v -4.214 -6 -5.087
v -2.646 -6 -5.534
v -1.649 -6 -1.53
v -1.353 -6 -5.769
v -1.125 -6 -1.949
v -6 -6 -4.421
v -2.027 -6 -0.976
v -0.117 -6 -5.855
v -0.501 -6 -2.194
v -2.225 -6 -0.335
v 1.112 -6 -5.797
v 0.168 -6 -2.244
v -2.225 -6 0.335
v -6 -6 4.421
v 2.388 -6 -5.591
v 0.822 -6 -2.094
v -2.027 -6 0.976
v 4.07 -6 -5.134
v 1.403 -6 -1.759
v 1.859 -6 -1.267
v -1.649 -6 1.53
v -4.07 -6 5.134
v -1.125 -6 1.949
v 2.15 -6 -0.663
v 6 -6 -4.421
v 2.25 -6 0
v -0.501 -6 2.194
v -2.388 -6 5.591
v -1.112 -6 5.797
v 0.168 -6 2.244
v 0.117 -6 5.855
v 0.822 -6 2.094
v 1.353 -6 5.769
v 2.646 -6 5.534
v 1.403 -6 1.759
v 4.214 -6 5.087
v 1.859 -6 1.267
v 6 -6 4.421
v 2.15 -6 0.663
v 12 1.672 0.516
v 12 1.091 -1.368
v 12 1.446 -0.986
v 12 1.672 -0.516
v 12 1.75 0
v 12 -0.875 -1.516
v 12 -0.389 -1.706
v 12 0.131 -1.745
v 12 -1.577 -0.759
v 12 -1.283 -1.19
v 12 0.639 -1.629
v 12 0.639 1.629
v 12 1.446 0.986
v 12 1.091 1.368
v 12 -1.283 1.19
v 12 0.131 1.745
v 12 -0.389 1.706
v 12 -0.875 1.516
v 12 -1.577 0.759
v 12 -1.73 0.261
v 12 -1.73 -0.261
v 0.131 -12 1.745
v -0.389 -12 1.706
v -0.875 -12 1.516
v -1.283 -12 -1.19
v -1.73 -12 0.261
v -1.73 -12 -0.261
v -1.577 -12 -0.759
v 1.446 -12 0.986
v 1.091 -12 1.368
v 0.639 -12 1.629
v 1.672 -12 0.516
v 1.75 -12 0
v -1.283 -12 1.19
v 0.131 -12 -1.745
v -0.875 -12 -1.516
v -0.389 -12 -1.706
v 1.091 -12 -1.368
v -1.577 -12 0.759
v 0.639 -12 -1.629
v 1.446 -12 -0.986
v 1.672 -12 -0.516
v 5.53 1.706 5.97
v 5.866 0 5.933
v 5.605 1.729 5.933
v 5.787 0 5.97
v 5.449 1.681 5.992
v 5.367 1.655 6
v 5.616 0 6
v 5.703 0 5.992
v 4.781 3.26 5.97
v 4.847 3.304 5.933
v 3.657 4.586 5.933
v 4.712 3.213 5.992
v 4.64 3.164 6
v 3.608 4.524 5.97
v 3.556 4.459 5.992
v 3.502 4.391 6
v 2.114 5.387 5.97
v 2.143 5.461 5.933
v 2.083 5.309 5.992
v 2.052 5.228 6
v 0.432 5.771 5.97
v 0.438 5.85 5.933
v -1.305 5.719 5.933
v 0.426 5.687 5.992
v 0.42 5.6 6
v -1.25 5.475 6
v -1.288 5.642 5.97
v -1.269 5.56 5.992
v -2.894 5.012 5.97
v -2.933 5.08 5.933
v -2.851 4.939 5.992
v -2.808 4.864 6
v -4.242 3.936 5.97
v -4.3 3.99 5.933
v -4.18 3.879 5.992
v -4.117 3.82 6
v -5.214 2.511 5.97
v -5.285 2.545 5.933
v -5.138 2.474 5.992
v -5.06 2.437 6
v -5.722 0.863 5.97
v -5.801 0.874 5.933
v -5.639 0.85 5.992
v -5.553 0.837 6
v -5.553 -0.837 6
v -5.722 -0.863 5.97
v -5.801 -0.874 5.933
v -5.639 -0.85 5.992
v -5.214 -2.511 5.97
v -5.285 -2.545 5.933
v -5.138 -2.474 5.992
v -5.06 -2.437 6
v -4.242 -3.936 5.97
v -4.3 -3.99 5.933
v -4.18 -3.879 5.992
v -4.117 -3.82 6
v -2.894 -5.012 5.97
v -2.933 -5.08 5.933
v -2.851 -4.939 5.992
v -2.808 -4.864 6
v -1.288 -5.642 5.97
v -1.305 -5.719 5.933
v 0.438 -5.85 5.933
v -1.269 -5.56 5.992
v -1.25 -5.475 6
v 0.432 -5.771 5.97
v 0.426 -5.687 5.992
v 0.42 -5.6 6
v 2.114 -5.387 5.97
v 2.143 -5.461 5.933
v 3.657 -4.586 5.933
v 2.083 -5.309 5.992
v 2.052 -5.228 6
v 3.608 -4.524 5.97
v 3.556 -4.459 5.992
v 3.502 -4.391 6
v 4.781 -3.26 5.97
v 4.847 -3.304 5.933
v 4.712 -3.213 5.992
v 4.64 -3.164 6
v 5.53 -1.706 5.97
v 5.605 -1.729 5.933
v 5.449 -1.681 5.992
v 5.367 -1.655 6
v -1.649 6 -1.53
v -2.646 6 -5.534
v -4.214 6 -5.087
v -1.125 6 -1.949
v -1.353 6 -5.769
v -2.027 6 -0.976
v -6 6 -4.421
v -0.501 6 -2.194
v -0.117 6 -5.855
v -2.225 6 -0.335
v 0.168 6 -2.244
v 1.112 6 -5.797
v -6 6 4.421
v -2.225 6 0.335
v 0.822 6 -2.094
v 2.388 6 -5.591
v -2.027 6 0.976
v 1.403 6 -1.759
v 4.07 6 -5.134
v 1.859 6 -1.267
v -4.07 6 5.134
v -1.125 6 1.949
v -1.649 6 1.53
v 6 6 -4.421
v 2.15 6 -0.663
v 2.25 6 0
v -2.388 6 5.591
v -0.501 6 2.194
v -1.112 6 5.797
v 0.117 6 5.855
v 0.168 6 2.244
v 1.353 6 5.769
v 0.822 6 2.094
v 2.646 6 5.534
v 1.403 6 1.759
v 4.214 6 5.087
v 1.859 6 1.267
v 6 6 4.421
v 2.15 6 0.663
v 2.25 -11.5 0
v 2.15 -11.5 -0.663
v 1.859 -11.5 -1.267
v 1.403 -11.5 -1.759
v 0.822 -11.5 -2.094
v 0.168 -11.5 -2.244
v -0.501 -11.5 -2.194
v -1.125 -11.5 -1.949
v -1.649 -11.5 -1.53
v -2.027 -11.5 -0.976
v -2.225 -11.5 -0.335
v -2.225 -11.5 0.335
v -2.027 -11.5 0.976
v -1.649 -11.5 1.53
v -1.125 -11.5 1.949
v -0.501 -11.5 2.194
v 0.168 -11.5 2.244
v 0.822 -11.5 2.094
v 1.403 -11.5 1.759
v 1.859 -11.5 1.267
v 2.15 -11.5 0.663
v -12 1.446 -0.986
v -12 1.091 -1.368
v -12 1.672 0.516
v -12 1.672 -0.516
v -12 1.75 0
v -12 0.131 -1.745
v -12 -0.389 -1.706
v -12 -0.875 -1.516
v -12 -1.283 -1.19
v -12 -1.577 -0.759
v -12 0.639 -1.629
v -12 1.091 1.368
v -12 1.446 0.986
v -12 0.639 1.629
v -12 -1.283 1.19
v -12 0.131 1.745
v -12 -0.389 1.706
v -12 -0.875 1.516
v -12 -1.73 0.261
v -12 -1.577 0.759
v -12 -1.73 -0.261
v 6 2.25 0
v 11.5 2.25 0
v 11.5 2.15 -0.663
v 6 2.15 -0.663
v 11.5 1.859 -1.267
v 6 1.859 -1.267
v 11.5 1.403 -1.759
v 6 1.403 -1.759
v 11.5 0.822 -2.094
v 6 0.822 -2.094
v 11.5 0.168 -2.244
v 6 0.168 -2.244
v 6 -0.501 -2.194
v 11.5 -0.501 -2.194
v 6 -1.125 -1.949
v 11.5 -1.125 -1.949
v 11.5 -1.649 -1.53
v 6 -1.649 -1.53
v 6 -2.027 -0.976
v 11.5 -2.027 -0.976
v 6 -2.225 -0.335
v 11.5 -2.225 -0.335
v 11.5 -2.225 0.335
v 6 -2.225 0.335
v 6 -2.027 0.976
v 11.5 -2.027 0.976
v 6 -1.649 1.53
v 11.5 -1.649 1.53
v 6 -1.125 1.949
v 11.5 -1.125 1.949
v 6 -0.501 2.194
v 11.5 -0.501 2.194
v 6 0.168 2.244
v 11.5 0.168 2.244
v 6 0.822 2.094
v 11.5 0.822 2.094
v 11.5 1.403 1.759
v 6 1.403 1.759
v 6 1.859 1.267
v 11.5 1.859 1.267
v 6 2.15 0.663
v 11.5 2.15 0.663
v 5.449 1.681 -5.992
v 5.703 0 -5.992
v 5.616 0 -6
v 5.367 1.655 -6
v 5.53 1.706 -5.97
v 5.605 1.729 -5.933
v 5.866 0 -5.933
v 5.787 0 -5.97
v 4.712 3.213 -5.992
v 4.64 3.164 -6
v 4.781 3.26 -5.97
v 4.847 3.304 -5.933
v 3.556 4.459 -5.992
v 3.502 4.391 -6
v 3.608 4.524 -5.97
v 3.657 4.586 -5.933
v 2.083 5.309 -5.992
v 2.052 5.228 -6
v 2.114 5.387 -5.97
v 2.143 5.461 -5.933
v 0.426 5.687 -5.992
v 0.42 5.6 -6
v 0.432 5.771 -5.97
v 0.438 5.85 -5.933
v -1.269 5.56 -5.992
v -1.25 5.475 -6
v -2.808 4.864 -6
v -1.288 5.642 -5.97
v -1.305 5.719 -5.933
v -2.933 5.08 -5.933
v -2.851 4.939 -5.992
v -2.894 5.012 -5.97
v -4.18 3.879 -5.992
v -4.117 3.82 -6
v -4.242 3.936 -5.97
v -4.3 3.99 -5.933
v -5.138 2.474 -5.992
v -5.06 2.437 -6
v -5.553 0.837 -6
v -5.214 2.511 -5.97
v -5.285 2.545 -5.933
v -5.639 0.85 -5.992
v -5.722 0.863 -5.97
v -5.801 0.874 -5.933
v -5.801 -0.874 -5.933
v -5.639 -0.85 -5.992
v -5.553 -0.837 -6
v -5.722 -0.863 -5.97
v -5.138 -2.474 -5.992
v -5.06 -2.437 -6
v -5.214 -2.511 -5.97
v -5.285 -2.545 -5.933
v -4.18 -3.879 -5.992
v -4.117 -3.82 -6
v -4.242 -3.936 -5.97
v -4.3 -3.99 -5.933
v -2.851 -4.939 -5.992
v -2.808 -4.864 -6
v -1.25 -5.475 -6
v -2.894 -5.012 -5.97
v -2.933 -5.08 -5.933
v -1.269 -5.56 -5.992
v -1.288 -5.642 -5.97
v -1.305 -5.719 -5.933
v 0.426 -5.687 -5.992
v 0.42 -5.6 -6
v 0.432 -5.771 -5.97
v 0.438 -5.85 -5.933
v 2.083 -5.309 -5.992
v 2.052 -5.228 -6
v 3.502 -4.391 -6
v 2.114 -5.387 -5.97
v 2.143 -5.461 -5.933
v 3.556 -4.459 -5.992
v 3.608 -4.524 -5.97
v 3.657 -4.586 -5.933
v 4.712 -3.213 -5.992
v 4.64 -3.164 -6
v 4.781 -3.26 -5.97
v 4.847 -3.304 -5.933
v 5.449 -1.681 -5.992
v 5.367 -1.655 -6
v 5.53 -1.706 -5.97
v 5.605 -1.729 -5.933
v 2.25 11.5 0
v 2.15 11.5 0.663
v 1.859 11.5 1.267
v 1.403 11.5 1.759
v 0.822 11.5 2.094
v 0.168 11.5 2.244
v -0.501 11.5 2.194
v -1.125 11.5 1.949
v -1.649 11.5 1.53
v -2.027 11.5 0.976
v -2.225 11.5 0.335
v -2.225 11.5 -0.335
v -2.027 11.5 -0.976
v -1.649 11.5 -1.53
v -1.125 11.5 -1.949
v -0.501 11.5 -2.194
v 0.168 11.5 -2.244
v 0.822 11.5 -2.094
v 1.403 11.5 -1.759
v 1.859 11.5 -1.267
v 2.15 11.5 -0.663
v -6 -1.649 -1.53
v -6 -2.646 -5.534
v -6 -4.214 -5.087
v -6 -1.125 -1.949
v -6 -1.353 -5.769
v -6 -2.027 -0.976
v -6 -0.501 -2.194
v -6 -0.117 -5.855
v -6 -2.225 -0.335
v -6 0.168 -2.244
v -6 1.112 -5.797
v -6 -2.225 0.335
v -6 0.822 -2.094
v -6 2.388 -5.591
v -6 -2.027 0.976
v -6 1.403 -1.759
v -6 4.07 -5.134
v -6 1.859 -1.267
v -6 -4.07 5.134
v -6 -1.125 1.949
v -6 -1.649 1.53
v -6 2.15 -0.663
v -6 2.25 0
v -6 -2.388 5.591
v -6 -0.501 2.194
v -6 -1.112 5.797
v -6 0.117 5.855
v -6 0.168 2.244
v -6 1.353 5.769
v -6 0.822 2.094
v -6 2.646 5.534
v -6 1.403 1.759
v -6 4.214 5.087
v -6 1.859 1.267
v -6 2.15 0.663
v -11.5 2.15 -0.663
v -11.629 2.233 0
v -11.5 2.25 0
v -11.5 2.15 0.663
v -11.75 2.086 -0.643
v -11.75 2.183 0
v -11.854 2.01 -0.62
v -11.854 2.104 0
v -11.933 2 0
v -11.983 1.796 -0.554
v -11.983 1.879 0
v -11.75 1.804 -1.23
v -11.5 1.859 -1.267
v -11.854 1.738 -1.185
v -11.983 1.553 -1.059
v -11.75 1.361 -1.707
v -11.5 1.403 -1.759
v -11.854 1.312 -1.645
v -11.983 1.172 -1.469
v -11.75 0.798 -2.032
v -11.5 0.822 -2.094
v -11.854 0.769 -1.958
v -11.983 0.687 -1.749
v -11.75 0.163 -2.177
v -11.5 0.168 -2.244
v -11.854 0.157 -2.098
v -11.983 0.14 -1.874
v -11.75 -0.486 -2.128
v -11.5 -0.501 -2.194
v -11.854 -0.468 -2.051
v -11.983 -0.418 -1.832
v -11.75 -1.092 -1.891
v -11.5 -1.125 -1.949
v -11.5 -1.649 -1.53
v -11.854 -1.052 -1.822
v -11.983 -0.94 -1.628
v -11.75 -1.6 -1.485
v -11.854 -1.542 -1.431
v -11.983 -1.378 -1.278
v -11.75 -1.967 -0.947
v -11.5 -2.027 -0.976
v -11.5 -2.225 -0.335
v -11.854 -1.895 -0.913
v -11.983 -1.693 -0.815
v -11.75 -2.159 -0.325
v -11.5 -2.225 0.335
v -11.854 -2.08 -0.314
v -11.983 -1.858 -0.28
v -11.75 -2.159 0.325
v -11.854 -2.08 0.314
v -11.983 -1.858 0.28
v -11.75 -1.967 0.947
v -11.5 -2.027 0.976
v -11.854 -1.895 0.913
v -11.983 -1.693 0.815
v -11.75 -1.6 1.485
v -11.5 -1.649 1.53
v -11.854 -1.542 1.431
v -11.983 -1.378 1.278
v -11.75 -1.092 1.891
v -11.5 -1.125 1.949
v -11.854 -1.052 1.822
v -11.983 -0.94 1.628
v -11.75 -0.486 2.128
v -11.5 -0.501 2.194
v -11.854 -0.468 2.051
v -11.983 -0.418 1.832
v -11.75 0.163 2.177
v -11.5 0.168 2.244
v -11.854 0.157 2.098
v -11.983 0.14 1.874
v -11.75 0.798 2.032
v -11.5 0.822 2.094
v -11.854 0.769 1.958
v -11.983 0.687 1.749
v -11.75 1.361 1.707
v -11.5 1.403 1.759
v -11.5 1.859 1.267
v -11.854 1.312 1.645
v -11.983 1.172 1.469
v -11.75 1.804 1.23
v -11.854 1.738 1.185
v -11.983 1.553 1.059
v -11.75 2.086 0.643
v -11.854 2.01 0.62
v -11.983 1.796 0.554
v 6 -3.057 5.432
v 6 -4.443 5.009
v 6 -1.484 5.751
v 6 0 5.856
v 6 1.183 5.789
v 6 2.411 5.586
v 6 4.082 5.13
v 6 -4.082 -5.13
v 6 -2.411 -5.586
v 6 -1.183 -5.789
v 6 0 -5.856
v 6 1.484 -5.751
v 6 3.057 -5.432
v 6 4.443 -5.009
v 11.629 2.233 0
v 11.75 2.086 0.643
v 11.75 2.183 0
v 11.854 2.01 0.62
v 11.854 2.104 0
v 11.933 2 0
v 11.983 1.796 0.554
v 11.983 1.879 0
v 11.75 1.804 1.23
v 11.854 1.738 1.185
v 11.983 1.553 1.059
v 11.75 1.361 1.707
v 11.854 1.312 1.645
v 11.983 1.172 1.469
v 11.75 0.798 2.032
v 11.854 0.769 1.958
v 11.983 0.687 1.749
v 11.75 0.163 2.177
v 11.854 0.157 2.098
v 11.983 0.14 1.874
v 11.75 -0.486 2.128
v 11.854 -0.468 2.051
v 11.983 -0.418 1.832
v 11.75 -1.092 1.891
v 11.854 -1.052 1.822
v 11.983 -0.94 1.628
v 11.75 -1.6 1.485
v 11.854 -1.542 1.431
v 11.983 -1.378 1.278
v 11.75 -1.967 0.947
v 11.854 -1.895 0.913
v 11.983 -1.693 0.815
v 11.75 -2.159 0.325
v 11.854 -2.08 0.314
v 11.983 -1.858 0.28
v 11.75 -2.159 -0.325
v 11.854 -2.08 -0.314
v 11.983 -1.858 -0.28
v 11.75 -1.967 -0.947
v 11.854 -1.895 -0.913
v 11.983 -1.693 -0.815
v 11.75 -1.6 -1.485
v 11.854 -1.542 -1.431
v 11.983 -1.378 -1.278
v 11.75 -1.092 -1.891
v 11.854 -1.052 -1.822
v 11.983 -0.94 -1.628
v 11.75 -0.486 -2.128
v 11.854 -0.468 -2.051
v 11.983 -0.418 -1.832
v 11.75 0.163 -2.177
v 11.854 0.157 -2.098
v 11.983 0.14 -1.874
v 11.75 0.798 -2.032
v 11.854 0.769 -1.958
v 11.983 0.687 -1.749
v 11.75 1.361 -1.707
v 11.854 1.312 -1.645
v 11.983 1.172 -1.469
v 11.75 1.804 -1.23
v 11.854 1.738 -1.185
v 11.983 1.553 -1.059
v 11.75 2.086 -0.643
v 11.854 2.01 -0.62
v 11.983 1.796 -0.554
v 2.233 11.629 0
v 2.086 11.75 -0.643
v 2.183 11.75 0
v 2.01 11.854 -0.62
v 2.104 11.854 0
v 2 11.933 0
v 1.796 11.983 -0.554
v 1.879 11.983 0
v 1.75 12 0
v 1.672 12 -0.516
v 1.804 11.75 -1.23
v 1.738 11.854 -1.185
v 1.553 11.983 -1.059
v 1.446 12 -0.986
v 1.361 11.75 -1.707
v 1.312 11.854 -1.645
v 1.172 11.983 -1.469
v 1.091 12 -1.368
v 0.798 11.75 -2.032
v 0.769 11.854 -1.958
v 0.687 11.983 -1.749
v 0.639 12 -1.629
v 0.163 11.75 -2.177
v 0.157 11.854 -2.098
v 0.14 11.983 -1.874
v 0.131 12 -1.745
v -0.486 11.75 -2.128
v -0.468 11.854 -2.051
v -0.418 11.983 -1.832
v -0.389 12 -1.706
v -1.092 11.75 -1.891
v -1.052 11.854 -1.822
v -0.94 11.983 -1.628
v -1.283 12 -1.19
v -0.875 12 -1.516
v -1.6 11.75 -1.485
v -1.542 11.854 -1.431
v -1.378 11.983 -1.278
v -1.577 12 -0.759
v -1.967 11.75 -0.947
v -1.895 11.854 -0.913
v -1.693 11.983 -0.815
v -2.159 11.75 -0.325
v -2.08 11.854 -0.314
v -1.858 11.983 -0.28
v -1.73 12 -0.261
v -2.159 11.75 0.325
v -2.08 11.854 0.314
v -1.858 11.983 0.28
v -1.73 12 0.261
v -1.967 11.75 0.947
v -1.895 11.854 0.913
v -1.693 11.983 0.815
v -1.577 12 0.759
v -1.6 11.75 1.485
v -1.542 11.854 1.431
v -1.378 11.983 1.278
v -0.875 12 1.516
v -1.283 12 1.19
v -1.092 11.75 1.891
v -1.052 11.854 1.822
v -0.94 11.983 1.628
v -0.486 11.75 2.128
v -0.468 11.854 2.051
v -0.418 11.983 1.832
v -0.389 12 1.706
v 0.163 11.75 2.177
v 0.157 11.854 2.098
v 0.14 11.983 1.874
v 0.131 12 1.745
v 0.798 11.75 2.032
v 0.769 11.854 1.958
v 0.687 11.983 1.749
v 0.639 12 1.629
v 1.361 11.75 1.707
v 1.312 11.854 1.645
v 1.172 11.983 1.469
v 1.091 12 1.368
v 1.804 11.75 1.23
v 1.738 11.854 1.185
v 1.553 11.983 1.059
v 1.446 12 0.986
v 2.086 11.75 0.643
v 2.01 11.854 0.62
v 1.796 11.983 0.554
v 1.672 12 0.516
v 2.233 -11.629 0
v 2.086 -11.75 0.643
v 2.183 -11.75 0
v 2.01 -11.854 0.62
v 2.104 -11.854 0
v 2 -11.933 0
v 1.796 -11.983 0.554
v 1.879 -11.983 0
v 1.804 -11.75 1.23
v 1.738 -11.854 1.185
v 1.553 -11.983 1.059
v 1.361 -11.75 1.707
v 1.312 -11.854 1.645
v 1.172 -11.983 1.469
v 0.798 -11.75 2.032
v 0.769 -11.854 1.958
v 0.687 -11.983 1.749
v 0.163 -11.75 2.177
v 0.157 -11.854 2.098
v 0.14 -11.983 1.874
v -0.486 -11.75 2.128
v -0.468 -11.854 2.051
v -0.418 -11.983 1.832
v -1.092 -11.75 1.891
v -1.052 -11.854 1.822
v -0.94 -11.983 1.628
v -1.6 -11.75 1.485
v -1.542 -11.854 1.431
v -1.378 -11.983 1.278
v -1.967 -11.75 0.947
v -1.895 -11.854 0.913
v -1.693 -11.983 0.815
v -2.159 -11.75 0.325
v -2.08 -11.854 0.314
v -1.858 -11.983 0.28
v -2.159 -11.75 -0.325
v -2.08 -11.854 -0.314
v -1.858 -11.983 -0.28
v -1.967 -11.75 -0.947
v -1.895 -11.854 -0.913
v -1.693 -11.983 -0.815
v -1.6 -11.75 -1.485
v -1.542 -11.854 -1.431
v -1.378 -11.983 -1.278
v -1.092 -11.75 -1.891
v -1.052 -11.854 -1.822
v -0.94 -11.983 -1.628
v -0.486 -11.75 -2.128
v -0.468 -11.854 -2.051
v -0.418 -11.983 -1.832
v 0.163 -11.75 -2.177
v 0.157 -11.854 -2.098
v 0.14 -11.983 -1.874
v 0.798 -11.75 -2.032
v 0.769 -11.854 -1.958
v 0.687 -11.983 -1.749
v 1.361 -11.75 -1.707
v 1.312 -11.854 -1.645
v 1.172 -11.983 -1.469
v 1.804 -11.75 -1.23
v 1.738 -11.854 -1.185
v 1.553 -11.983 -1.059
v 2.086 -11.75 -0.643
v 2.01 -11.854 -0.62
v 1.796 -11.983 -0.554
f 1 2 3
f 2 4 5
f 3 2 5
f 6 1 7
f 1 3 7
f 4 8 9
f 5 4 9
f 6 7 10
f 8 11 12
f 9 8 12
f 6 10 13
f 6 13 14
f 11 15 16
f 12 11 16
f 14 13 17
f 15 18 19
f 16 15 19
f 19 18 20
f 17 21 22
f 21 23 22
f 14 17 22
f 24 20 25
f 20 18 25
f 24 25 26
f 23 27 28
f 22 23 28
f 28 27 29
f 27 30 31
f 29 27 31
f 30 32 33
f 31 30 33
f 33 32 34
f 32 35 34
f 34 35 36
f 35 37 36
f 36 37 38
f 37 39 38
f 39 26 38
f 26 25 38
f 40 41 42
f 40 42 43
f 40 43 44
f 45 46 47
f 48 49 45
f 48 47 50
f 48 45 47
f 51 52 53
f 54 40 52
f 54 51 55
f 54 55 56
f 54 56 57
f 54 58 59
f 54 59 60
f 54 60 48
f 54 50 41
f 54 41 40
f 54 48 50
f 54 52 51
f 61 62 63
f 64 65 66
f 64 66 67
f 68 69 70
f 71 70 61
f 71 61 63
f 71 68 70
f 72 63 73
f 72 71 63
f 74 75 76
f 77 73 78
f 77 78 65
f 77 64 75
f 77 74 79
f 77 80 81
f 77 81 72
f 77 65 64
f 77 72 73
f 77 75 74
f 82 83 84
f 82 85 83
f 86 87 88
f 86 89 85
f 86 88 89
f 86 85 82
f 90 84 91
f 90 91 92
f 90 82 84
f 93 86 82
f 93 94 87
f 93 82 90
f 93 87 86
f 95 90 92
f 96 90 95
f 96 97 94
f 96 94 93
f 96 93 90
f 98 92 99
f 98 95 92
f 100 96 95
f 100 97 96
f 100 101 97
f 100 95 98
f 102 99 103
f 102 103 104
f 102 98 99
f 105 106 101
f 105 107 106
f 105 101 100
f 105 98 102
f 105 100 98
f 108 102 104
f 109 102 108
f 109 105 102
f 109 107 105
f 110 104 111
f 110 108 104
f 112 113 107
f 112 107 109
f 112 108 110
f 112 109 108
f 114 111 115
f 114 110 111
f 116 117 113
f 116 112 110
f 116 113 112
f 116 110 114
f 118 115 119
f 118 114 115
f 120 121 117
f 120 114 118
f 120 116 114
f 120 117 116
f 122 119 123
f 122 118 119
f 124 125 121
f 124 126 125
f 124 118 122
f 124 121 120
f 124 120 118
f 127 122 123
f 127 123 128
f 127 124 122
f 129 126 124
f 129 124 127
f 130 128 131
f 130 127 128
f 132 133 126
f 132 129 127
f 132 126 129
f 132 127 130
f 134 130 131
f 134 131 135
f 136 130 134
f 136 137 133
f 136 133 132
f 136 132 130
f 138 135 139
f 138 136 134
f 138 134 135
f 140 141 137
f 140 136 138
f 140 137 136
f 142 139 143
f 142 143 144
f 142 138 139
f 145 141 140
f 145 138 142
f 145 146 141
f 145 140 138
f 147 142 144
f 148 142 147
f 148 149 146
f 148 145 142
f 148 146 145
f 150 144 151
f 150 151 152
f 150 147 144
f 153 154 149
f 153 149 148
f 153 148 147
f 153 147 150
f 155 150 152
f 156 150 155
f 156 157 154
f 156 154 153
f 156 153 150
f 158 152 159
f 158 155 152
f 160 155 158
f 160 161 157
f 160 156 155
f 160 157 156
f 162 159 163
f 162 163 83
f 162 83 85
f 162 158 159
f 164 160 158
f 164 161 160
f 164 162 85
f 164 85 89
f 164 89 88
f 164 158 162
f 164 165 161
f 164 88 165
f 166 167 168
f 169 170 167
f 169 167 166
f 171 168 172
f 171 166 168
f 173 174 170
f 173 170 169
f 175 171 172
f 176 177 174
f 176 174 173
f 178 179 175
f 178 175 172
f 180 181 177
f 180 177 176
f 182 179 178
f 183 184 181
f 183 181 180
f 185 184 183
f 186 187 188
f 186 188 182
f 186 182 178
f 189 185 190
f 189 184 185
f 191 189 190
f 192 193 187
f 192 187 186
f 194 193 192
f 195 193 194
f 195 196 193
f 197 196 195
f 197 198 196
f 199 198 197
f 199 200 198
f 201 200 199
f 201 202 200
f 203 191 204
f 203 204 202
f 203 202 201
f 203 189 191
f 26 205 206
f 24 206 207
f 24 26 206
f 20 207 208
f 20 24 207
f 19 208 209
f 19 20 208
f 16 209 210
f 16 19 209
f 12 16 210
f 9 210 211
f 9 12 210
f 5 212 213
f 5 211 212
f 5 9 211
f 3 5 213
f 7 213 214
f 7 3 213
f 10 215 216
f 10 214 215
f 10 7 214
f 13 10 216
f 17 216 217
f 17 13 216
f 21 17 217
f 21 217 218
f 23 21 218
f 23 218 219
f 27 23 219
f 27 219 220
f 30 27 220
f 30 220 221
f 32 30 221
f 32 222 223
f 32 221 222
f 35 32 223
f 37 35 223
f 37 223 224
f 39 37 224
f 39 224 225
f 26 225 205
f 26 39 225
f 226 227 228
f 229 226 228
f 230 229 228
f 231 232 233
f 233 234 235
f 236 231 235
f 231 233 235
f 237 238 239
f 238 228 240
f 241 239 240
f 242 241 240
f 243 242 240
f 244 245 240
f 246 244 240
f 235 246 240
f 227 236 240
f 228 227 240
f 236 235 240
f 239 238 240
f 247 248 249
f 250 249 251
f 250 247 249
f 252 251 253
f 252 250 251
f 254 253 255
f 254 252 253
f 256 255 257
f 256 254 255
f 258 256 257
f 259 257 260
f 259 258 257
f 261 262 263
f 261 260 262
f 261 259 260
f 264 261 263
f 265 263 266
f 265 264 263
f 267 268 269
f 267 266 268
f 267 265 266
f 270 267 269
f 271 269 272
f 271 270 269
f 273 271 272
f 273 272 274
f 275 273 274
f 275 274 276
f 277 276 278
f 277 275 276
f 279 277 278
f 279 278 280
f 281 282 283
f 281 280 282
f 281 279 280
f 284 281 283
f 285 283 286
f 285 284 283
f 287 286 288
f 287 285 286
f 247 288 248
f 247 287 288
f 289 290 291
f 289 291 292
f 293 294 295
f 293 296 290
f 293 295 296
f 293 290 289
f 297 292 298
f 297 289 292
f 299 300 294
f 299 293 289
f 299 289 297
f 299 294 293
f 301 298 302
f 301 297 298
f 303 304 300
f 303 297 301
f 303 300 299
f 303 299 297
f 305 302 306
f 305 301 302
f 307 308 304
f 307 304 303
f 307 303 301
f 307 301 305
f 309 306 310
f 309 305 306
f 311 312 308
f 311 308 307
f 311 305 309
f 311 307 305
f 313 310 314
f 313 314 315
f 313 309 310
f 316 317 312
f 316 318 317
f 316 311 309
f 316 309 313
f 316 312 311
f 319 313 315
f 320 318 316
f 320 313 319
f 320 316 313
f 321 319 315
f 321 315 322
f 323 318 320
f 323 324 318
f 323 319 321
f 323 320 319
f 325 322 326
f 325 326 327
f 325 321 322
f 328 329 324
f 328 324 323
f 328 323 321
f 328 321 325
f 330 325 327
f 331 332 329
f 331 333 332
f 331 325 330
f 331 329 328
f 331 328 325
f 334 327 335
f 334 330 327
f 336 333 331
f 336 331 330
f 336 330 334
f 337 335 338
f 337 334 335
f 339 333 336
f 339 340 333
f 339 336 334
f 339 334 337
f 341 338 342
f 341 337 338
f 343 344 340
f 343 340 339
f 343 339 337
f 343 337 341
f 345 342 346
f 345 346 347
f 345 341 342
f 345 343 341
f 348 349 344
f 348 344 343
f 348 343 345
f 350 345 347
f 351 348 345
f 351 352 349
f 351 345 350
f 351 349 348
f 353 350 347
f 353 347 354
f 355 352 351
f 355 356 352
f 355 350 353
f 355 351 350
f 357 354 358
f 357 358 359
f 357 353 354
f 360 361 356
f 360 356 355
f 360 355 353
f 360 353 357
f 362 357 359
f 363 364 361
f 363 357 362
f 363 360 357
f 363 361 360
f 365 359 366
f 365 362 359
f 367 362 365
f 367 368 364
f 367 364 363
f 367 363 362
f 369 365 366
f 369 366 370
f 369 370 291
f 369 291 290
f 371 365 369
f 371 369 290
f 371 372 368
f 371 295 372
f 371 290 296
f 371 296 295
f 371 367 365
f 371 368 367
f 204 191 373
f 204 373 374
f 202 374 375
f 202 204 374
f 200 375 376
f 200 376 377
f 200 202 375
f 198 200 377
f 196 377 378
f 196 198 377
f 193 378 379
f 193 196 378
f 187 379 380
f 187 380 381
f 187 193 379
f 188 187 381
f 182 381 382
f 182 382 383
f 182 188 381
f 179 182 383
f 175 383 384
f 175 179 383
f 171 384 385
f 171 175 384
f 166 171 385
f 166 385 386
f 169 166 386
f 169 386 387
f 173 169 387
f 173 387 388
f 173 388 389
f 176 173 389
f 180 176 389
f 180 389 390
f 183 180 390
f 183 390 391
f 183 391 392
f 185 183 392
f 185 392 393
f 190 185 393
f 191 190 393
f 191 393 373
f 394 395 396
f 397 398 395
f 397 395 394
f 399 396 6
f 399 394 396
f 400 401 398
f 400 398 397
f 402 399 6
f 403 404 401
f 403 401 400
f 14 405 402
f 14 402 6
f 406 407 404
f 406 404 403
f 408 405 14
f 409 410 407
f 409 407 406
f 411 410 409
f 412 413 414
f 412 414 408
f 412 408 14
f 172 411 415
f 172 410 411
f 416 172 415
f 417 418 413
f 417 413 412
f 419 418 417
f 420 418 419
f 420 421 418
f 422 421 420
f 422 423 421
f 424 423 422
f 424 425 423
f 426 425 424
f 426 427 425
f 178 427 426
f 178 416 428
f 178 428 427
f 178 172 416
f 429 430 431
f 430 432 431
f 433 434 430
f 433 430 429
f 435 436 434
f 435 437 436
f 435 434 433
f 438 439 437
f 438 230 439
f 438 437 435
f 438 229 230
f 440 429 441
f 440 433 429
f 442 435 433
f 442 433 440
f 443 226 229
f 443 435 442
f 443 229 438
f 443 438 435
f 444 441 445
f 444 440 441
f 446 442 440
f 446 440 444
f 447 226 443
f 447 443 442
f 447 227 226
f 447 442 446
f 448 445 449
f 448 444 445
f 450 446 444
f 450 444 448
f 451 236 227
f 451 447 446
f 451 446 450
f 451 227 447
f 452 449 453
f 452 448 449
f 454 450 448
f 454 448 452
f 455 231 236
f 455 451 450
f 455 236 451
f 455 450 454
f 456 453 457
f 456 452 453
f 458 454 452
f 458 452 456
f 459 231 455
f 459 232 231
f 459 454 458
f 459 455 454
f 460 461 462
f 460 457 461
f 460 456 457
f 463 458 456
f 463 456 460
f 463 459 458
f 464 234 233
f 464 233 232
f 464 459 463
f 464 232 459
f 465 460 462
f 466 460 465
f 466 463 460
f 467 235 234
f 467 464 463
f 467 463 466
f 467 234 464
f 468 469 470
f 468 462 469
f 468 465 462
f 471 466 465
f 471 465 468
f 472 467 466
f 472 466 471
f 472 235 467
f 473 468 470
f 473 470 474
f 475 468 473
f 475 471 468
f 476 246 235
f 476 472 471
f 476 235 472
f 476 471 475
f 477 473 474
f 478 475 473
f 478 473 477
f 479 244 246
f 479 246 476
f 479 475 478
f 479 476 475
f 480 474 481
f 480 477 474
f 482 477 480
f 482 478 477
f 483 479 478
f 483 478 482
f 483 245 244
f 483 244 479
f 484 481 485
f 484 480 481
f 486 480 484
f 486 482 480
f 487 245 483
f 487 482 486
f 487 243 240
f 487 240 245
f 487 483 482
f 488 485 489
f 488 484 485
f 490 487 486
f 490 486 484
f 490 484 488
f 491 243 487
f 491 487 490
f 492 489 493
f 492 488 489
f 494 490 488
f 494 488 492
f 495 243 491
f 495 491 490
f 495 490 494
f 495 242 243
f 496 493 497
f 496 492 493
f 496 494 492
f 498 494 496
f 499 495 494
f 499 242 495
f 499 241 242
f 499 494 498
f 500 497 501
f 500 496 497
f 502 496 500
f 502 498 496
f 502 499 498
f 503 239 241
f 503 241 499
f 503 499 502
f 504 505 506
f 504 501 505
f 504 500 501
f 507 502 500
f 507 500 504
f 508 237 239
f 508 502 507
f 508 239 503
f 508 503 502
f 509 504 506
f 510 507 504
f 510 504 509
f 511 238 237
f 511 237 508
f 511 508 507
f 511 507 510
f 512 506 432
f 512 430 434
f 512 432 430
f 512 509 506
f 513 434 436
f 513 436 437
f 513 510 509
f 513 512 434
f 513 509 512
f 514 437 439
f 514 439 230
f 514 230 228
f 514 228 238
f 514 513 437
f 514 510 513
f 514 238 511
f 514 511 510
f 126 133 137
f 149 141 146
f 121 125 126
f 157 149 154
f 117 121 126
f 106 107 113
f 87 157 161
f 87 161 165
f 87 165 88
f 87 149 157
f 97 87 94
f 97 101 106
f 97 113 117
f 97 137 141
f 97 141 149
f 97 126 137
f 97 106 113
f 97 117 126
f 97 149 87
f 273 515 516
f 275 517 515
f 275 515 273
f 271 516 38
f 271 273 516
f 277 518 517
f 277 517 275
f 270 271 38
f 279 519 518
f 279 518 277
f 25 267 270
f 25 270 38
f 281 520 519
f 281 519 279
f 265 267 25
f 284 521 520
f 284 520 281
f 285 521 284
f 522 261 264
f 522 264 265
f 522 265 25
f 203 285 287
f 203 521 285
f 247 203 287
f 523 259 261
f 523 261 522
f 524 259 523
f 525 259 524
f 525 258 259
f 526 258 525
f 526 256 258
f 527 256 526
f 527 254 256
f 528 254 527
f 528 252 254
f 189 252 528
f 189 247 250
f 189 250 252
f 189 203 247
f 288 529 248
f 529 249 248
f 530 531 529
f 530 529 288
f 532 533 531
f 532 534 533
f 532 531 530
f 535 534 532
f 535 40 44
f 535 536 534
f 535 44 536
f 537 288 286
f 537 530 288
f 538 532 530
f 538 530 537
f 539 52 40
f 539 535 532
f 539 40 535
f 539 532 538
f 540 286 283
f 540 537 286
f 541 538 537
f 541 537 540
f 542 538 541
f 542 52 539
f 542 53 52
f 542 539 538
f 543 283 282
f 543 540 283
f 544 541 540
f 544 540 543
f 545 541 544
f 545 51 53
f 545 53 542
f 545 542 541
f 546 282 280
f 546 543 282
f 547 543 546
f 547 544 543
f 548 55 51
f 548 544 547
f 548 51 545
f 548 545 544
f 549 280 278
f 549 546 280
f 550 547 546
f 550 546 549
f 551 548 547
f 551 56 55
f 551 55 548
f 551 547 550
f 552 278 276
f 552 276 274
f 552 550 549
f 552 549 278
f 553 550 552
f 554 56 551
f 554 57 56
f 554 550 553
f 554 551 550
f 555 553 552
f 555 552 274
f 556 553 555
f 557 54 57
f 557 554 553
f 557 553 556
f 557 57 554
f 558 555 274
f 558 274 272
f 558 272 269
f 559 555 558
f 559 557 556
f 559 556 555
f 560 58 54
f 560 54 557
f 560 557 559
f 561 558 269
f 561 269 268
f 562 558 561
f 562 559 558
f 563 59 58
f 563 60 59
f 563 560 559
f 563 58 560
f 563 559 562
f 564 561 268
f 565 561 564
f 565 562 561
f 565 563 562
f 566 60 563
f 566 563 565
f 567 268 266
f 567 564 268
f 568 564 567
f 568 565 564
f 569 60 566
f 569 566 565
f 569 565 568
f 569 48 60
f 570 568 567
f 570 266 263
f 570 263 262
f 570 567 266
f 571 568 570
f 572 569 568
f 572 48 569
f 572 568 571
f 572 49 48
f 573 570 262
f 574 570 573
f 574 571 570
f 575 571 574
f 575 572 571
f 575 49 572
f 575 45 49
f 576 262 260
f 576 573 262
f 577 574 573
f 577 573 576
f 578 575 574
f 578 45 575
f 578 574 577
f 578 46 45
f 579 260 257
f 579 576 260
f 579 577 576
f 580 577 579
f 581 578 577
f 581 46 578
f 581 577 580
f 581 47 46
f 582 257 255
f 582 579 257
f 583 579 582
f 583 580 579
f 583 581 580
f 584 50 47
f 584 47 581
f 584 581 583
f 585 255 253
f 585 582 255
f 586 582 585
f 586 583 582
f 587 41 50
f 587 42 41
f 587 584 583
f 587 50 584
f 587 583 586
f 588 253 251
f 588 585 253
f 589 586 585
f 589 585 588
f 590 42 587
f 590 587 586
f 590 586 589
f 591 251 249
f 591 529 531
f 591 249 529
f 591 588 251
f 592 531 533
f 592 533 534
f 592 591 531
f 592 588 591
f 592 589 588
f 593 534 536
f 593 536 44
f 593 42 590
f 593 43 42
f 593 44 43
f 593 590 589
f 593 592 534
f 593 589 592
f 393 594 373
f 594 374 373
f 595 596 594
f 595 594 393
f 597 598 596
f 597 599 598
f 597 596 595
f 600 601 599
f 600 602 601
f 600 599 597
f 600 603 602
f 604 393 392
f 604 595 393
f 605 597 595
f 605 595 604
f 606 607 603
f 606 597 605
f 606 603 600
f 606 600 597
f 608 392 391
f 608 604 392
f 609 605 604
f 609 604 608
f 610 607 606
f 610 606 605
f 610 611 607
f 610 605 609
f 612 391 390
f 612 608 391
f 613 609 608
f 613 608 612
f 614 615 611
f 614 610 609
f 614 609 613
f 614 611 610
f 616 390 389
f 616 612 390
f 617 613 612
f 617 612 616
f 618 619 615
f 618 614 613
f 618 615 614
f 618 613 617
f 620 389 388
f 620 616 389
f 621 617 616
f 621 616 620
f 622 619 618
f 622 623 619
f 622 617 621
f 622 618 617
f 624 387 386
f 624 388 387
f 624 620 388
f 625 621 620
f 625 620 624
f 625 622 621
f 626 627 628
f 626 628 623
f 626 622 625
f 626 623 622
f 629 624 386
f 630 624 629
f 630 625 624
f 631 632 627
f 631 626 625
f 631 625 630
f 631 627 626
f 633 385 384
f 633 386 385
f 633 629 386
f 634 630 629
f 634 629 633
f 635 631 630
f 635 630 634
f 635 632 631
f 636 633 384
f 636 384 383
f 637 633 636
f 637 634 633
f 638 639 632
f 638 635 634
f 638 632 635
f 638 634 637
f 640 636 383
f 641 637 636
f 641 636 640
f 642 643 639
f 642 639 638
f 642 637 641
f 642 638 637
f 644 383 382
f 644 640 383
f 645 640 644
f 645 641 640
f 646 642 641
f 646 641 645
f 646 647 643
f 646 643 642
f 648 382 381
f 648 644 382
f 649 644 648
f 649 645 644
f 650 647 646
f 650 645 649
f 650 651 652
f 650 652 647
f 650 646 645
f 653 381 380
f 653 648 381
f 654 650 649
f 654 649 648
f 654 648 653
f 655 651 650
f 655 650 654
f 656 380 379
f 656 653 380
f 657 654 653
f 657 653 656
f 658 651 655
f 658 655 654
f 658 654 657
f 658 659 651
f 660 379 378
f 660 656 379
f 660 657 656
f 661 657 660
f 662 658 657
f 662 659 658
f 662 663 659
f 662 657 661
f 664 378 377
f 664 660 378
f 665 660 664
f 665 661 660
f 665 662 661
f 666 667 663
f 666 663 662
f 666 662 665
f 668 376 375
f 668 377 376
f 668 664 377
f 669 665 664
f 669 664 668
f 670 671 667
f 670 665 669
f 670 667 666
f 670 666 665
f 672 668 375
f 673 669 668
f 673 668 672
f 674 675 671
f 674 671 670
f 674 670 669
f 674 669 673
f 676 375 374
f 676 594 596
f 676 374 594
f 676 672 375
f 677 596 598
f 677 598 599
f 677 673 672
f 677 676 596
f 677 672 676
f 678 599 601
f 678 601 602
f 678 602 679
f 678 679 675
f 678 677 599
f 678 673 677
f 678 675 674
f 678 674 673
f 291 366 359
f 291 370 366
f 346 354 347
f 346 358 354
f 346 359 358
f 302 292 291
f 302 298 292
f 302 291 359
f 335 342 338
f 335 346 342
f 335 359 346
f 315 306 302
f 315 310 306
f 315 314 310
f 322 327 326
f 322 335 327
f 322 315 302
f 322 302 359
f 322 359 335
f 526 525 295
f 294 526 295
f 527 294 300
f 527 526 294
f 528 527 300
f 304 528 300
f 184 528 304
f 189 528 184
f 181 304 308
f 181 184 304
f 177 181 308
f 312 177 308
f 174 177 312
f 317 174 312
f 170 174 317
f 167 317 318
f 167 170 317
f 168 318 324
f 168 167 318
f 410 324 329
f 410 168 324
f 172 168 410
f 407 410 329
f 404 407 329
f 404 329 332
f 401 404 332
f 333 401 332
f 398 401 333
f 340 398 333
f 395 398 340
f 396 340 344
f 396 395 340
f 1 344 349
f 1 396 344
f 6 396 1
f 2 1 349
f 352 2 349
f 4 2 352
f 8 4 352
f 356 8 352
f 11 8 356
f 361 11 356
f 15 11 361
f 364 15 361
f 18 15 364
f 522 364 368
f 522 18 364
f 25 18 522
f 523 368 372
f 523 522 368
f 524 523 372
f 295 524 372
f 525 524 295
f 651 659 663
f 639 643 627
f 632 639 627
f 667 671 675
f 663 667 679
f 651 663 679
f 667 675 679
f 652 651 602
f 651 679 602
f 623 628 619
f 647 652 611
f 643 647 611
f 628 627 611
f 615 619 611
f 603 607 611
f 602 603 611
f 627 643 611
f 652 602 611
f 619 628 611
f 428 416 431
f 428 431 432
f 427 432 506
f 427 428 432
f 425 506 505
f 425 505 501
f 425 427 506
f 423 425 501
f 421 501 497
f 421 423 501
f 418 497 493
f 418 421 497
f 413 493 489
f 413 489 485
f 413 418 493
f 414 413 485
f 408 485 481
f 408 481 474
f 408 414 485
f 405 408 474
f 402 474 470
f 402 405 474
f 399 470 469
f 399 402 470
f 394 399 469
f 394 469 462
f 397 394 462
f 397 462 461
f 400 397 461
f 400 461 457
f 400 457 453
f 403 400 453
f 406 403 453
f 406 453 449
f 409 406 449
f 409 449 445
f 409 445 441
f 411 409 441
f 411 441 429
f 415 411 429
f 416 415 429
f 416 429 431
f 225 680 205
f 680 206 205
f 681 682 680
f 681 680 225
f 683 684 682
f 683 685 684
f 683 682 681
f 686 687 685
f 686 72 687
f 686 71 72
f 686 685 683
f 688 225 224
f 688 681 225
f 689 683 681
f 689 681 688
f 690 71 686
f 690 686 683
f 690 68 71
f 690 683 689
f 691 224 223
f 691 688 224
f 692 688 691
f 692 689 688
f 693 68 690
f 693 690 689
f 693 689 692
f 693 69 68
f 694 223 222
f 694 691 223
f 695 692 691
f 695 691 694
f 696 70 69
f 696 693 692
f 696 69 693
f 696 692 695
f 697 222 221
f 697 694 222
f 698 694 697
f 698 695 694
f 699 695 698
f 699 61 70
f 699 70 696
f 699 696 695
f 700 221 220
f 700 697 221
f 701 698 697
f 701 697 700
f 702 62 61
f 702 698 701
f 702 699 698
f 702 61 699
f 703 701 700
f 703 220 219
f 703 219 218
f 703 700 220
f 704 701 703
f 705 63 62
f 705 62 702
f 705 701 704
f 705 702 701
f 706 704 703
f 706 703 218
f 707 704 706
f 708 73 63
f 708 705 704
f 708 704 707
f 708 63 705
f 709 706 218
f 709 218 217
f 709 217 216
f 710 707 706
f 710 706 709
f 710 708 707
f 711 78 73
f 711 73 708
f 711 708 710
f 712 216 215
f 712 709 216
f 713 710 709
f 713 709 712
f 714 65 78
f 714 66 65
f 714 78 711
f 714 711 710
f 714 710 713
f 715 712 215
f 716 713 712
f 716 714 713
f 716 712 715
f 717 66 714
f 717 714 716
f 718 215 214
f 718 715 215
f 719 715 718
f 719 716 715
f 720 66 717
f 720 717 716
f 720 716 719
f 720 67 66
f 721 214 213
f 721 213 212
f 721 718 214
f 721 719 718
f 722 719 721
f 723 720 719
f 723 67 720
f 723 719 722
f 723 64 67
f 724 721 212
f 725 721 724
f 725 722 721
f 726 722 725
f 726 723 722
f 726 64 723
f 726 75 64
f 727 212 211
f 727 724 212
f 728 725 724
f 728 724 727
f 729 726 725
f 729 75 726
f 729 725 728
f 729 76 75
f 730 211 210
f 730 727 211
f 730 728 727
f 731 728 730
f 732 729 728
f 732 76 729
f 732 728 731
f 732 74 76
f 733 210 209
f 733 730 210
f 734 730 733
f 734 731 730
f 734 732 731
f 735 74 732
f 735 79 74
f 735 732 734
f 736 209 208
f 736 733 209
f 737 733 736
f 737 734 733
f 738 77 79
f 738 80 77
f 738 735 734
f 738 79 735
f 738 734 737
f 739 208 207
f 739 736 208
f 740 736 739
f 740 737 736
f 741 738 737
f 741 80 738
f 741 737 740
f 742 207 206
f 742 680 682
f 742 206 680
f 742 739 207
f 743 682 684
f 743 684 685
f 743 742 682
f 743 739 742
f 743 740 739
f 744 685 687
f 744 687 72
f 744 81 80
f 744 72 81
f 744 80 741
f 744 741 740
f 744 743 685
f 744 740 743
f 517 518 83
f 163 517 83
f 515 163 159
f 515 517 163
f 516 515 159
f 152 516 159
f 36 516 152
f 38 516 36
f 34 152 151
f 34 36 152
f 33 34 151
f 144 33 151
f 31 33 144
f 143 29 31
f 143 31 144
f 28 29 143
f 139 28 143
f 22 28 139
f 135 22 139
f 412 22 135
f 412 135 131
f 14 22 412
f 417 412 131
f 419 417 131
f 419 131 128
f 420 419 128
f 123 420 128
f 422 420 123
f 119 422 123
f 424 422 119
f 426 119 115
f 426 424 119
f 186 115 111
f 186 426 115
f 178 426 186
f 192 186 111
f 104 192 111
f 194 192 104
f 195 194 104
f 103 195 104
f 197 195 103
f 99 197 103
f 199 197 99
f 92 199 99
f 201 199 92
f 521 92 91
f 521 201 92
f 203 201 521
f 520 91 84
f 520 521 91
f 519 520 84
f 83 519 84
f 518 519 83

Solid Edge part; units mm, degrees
sketch "Sketch1" plane through (0, 0, 0) normal (0, -1, 0) x (1, 0, 0)
  line L0 (6, -6) -> (-6, -6)
  line L1 (-6, -6) -> (-6, 6)
  line L2 (-6, 6) -> (6, 6)
  line L3 (6, 6) -> (6, -6)
  dimension "D1" = 12
  dimension "D2" = 12
extrude "Protrusion1" add sketch "Sketch1" along normal mid plane 12
sketch "Sketch2" plane through (0, 0, 0) normal (0, -1, 0) x (1, 0, 0)
  line L0 (9.56, 3.8003) -> (5.75, 6)
  line L1 (5.75, 6) -> (12.1, 6)
  line L2 (12.1, 6) -> (12.1, -6)
  line L3 (12.1, -6) -> (5.75, -6)
  line L4 (5.75, -6) -> (9.56, -3.8003)
  line L5 (9.56, -3.8003) -> (9.56, 3.8003)
revolve "RevolvedCutout1" cut sketch "Sketch2" angle 360 about axis through (0, 0, 0) along (0, 0, 1)
sketch "Sketch3" plane through (0, 0, 0) normal (1, 0, 0) x (0, 1, 0)
  circle A0 centre (0, 0) radius 2.25
  dimension "D1" = 4.5
extrude "ExtrudedProtrusion_3" add sketch "Sketch3" along normal mid plane 24
sketch "Sketch4" plane through (0, 0, 0) normal (0, -1, 0) x (1, 0, 0)
  circle A0 centre (0, 0) radius 2.25
  dimension "D1" = 4.5
extrude "ExtrudedProtrusion_4" add sketch "Sketch4" along normal mid plane 24
fillet "Round_1" radius 0.5 6 edges at (-2.25, -12, 0) (12, -2.25, 0) (-2.25, 12, 0) (-12, -2.25, 0) (-5.75, 0, 6) (-5.75, 0, -6)
extrude "ExtrudedCutout_1" [suppressed]
